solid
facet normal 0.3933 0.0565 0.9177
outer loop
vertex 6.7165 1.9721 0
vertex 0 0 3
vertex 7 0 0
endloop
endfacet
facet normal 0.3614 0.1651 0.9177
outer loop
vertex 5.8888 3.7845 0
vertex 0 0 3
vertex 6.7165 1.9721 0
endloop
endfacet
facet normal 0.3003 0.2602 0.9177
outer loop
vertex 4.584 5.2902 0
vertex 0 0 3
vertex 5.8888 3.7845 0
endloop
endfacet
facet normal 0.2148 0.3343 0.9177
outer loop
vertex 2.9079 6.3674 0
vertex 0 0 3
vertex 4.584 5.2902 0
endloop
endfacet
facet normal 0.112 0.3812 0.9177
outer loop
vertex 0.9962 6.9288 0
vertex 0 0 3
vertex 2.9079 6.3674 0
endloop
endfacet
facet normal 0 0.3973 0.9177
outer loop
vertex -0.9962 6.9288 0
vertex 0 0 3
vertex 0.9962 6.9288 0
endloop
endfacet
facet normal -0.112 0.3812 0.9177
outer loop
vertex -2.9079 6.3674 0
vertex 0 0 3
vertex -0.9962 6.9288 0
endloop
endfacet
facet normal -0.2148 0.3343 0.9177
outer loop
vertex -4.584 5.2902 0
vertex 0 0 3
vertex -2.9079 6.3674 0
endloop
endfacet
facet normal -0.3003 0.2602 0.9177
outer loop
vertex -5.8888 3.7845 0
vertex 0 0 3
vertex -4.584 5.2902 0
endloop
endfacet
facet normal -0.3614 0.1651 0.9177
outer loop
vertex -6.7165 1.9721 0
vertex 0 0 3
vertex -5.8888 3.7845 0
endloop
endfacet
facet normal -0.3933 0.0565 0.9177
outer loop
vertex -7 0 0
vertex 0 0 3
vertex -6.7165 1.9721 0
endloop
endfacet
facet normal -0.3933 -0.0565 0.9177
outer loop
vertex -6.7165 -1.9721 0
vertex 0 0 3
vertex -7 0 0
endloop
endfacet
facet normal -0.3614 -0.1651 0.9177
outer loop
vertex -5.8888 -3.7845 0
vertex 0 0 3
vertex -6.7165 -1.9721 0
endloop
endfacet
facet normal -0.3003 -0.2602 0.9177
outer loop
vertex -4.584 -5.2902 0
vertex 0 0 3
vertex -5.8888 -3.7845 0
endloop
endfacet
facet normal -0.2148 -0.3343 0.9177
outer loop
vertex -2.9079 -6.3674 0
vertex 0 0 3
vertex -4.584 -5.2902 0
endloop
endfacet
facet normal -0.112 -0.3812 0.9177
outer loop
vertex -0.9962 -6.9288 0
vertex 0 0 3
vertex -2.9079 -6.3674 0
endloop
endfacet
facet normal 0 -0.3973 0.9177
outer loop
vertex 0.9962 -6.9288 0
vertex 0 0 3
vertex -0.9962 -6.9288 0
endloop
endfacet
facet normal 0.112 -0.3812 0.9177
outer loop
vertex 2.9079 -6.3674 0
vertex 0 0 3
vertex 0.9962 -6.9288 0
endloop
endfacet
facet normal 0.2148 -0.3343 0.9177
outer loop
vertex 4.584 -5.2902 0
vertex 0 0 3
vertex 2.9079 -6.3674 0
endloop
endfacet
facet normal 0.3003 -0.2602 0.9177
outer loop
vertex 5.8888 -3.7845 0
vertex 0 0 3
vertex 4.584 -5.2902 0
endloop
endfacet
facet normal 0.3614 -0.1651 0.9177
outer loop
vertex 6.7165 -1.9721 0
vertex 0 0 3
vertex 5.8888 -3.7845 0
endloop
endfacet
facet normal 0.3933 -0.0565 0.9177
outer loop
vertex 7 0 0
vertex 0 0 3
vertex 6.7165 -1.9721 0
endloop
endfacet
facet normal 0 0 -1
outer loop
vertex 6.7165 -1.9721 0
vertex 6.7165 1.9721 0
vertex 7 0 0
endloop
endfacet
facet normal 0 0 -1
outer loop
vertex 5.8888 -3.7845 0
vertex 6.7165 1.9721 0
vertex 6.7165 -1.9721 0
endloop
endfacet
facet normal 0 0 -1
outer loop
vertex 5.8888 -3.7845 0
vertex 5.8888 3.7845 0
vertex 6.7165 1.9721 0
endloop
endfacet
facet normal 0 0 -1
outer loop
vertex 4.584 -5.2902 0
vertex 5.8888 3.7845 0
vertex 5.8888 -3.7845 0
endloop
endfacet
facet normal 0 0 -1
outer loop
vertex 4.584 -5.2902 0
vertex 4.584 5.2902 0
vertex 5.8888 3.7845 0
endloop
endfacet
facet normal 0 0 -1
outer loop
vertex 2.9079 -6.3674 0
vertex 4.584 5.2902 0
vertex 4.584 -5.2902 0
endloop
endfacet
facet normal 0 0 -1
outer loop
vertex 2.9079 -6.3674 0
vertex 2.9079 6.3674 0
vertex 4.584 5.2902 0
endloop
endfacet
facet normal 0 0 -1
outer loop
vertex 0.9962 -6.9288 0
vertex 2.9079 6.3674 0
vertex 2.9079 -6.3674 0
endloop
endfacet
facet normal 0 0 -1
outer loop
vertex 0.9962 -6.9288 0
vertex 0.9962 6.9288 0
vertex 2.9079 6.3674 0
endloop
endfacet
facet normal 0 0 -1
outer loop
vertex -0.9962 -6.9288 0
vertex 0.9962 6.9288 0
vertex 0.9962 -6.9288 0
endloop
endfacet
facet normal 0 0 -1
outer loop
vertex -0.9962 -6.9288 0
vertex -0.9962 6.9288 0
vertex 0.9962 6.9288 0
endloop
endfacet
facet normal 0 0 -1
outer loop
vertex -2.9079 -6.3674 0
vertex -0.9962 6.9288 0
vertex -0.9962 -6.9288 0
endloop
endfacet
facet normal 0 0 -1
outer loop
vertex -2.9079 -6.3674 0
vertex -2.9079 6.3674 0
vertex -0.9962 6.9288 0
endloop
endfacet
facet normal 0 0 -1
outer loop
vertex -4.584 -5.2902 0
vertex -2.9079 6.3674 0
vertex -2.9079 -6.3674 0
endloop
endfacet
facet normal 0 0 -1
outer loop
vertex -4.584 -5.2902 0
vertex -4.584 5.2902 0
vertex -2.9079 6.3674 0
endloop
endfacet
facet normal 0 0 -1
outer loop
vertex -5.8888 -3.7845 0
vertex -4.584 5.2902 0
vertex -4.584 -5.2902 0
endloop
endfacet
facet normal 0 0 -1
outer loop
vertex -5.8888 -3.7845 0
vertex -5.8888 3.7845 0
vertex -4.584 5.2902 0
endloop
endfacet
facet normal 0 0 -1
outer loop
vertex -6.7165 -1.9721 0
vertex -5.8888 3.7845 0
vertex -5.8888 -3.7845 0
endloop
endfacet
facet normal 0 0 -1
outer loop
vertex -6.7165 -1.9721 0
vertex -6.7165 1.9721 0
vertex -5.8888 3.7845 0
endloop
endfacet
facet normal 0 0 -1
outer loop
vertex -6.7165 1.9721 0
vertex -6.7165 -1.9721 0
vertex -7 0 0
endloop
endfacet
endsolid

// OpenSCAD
// Generated by SolidPython 1.0.1 on 2020-07-29 00:39:25


cylinder(h = 3, r1 = 7, r2 = 0);
/***********************************************
*********      SolidPython code:      **********
************************************************
 
# import packages: SolidPython
from solid import *
from solid.utils import *
from itertools import chain, combinations


class Resize:

    def __init__(self, scad_file):
        self.scad_file = scad_file
        #self.scad_file = import_scad(scad_file)
        # cone/cylinder param:
        self.r1 = 0
        self.r2 = 0
        self.h = 0
        # rectangular prism param:
        self.w = 0
        self.l = 0
        # ellipse param:
        self.r = 0

    # import OpenScad code (file name corresponds to shape)


    # classify shape + parameters
    def assign(self, param1, param2, param3):
        if self.scad_file == 'cone.scad':
            self.r1 = param1
            self.r2 = param2
            self.h = param3
        elif self.scad_file == 'cylinder.scad':
            self.r1 = param1
            self.r2 = param2
            self.h = param3
        elif self.scad_file == 'rectangularPrism.scad':
            self.h = param1
            self.l = param2
            self.w = param3
        else:
            self.r = param1
            self.h = param2

    # resize parameters
    def iterate(self):
        x = range(3, 20, 2)
        i = 1
        if self.scad_file == 'cone.scad':
            tempList = list(combinations(x, 2))
            for temp in tempList:
                param1 = temp[0]
                param2 = temp[1]
                filepath = 'produced_scad_files/' + 'cone' + str(param1) + '_' + str(param2) + '_' + '.scad'
                scad_render_to_file(cylinder(h=param1, r1=param2, r2=0), filepath)

        elif self.scad_file == 'cylinder.scad':
            tempList = list(combinations(x, 3))
            for temp in tempList:
                param1 = temp[0]
                param2 = temp[1]
                filepath = 'produced_scad_files/' + 'cylinder' + str(param1) + '_' + str(param2) + '_' + '.scad'
                scad_render_to_file(cylinder(h=param1, r1=param2, r2=param2), filepath)

        elif self.scad_file == 'rectangularPrism.scad':
            tempList = list(combinations(x, 3))
            for temp in tempList:
                param1 = temp[0]
                param2 = temp[1]
                param3 = temp[2]
                filepath = 'produced_scad_files/' + 'rectangularPrism' + str(param1) + '_' + str(param2) + '_' + str(
                    param3) + '.scad'
                scad_render_to_file(cube(size=(param1, param2, param3)), filepath)

        elif self.scad_file == 'ellipse.scad':
            tempList = list(combinations(x, 4))
            for temp in tempList:
                param1 = temp[0]
                param2 = temp[1]
                param3 = temp[2]
                param4 = temp[3]
                filepath = 'produced_scad_files/' + 'ellipse' + str(param1) + '_' + str(param2) + '_' + str(param3) + '_' + str(param4) + '.scad'
                scad_render_to_file(scale([param1, param2, param3])(sphere(r=param4)), filepath)

    def render_to_scadfile(self):
        scad_render_to_file(scad, 'example.scad') 
 
************************************************/
